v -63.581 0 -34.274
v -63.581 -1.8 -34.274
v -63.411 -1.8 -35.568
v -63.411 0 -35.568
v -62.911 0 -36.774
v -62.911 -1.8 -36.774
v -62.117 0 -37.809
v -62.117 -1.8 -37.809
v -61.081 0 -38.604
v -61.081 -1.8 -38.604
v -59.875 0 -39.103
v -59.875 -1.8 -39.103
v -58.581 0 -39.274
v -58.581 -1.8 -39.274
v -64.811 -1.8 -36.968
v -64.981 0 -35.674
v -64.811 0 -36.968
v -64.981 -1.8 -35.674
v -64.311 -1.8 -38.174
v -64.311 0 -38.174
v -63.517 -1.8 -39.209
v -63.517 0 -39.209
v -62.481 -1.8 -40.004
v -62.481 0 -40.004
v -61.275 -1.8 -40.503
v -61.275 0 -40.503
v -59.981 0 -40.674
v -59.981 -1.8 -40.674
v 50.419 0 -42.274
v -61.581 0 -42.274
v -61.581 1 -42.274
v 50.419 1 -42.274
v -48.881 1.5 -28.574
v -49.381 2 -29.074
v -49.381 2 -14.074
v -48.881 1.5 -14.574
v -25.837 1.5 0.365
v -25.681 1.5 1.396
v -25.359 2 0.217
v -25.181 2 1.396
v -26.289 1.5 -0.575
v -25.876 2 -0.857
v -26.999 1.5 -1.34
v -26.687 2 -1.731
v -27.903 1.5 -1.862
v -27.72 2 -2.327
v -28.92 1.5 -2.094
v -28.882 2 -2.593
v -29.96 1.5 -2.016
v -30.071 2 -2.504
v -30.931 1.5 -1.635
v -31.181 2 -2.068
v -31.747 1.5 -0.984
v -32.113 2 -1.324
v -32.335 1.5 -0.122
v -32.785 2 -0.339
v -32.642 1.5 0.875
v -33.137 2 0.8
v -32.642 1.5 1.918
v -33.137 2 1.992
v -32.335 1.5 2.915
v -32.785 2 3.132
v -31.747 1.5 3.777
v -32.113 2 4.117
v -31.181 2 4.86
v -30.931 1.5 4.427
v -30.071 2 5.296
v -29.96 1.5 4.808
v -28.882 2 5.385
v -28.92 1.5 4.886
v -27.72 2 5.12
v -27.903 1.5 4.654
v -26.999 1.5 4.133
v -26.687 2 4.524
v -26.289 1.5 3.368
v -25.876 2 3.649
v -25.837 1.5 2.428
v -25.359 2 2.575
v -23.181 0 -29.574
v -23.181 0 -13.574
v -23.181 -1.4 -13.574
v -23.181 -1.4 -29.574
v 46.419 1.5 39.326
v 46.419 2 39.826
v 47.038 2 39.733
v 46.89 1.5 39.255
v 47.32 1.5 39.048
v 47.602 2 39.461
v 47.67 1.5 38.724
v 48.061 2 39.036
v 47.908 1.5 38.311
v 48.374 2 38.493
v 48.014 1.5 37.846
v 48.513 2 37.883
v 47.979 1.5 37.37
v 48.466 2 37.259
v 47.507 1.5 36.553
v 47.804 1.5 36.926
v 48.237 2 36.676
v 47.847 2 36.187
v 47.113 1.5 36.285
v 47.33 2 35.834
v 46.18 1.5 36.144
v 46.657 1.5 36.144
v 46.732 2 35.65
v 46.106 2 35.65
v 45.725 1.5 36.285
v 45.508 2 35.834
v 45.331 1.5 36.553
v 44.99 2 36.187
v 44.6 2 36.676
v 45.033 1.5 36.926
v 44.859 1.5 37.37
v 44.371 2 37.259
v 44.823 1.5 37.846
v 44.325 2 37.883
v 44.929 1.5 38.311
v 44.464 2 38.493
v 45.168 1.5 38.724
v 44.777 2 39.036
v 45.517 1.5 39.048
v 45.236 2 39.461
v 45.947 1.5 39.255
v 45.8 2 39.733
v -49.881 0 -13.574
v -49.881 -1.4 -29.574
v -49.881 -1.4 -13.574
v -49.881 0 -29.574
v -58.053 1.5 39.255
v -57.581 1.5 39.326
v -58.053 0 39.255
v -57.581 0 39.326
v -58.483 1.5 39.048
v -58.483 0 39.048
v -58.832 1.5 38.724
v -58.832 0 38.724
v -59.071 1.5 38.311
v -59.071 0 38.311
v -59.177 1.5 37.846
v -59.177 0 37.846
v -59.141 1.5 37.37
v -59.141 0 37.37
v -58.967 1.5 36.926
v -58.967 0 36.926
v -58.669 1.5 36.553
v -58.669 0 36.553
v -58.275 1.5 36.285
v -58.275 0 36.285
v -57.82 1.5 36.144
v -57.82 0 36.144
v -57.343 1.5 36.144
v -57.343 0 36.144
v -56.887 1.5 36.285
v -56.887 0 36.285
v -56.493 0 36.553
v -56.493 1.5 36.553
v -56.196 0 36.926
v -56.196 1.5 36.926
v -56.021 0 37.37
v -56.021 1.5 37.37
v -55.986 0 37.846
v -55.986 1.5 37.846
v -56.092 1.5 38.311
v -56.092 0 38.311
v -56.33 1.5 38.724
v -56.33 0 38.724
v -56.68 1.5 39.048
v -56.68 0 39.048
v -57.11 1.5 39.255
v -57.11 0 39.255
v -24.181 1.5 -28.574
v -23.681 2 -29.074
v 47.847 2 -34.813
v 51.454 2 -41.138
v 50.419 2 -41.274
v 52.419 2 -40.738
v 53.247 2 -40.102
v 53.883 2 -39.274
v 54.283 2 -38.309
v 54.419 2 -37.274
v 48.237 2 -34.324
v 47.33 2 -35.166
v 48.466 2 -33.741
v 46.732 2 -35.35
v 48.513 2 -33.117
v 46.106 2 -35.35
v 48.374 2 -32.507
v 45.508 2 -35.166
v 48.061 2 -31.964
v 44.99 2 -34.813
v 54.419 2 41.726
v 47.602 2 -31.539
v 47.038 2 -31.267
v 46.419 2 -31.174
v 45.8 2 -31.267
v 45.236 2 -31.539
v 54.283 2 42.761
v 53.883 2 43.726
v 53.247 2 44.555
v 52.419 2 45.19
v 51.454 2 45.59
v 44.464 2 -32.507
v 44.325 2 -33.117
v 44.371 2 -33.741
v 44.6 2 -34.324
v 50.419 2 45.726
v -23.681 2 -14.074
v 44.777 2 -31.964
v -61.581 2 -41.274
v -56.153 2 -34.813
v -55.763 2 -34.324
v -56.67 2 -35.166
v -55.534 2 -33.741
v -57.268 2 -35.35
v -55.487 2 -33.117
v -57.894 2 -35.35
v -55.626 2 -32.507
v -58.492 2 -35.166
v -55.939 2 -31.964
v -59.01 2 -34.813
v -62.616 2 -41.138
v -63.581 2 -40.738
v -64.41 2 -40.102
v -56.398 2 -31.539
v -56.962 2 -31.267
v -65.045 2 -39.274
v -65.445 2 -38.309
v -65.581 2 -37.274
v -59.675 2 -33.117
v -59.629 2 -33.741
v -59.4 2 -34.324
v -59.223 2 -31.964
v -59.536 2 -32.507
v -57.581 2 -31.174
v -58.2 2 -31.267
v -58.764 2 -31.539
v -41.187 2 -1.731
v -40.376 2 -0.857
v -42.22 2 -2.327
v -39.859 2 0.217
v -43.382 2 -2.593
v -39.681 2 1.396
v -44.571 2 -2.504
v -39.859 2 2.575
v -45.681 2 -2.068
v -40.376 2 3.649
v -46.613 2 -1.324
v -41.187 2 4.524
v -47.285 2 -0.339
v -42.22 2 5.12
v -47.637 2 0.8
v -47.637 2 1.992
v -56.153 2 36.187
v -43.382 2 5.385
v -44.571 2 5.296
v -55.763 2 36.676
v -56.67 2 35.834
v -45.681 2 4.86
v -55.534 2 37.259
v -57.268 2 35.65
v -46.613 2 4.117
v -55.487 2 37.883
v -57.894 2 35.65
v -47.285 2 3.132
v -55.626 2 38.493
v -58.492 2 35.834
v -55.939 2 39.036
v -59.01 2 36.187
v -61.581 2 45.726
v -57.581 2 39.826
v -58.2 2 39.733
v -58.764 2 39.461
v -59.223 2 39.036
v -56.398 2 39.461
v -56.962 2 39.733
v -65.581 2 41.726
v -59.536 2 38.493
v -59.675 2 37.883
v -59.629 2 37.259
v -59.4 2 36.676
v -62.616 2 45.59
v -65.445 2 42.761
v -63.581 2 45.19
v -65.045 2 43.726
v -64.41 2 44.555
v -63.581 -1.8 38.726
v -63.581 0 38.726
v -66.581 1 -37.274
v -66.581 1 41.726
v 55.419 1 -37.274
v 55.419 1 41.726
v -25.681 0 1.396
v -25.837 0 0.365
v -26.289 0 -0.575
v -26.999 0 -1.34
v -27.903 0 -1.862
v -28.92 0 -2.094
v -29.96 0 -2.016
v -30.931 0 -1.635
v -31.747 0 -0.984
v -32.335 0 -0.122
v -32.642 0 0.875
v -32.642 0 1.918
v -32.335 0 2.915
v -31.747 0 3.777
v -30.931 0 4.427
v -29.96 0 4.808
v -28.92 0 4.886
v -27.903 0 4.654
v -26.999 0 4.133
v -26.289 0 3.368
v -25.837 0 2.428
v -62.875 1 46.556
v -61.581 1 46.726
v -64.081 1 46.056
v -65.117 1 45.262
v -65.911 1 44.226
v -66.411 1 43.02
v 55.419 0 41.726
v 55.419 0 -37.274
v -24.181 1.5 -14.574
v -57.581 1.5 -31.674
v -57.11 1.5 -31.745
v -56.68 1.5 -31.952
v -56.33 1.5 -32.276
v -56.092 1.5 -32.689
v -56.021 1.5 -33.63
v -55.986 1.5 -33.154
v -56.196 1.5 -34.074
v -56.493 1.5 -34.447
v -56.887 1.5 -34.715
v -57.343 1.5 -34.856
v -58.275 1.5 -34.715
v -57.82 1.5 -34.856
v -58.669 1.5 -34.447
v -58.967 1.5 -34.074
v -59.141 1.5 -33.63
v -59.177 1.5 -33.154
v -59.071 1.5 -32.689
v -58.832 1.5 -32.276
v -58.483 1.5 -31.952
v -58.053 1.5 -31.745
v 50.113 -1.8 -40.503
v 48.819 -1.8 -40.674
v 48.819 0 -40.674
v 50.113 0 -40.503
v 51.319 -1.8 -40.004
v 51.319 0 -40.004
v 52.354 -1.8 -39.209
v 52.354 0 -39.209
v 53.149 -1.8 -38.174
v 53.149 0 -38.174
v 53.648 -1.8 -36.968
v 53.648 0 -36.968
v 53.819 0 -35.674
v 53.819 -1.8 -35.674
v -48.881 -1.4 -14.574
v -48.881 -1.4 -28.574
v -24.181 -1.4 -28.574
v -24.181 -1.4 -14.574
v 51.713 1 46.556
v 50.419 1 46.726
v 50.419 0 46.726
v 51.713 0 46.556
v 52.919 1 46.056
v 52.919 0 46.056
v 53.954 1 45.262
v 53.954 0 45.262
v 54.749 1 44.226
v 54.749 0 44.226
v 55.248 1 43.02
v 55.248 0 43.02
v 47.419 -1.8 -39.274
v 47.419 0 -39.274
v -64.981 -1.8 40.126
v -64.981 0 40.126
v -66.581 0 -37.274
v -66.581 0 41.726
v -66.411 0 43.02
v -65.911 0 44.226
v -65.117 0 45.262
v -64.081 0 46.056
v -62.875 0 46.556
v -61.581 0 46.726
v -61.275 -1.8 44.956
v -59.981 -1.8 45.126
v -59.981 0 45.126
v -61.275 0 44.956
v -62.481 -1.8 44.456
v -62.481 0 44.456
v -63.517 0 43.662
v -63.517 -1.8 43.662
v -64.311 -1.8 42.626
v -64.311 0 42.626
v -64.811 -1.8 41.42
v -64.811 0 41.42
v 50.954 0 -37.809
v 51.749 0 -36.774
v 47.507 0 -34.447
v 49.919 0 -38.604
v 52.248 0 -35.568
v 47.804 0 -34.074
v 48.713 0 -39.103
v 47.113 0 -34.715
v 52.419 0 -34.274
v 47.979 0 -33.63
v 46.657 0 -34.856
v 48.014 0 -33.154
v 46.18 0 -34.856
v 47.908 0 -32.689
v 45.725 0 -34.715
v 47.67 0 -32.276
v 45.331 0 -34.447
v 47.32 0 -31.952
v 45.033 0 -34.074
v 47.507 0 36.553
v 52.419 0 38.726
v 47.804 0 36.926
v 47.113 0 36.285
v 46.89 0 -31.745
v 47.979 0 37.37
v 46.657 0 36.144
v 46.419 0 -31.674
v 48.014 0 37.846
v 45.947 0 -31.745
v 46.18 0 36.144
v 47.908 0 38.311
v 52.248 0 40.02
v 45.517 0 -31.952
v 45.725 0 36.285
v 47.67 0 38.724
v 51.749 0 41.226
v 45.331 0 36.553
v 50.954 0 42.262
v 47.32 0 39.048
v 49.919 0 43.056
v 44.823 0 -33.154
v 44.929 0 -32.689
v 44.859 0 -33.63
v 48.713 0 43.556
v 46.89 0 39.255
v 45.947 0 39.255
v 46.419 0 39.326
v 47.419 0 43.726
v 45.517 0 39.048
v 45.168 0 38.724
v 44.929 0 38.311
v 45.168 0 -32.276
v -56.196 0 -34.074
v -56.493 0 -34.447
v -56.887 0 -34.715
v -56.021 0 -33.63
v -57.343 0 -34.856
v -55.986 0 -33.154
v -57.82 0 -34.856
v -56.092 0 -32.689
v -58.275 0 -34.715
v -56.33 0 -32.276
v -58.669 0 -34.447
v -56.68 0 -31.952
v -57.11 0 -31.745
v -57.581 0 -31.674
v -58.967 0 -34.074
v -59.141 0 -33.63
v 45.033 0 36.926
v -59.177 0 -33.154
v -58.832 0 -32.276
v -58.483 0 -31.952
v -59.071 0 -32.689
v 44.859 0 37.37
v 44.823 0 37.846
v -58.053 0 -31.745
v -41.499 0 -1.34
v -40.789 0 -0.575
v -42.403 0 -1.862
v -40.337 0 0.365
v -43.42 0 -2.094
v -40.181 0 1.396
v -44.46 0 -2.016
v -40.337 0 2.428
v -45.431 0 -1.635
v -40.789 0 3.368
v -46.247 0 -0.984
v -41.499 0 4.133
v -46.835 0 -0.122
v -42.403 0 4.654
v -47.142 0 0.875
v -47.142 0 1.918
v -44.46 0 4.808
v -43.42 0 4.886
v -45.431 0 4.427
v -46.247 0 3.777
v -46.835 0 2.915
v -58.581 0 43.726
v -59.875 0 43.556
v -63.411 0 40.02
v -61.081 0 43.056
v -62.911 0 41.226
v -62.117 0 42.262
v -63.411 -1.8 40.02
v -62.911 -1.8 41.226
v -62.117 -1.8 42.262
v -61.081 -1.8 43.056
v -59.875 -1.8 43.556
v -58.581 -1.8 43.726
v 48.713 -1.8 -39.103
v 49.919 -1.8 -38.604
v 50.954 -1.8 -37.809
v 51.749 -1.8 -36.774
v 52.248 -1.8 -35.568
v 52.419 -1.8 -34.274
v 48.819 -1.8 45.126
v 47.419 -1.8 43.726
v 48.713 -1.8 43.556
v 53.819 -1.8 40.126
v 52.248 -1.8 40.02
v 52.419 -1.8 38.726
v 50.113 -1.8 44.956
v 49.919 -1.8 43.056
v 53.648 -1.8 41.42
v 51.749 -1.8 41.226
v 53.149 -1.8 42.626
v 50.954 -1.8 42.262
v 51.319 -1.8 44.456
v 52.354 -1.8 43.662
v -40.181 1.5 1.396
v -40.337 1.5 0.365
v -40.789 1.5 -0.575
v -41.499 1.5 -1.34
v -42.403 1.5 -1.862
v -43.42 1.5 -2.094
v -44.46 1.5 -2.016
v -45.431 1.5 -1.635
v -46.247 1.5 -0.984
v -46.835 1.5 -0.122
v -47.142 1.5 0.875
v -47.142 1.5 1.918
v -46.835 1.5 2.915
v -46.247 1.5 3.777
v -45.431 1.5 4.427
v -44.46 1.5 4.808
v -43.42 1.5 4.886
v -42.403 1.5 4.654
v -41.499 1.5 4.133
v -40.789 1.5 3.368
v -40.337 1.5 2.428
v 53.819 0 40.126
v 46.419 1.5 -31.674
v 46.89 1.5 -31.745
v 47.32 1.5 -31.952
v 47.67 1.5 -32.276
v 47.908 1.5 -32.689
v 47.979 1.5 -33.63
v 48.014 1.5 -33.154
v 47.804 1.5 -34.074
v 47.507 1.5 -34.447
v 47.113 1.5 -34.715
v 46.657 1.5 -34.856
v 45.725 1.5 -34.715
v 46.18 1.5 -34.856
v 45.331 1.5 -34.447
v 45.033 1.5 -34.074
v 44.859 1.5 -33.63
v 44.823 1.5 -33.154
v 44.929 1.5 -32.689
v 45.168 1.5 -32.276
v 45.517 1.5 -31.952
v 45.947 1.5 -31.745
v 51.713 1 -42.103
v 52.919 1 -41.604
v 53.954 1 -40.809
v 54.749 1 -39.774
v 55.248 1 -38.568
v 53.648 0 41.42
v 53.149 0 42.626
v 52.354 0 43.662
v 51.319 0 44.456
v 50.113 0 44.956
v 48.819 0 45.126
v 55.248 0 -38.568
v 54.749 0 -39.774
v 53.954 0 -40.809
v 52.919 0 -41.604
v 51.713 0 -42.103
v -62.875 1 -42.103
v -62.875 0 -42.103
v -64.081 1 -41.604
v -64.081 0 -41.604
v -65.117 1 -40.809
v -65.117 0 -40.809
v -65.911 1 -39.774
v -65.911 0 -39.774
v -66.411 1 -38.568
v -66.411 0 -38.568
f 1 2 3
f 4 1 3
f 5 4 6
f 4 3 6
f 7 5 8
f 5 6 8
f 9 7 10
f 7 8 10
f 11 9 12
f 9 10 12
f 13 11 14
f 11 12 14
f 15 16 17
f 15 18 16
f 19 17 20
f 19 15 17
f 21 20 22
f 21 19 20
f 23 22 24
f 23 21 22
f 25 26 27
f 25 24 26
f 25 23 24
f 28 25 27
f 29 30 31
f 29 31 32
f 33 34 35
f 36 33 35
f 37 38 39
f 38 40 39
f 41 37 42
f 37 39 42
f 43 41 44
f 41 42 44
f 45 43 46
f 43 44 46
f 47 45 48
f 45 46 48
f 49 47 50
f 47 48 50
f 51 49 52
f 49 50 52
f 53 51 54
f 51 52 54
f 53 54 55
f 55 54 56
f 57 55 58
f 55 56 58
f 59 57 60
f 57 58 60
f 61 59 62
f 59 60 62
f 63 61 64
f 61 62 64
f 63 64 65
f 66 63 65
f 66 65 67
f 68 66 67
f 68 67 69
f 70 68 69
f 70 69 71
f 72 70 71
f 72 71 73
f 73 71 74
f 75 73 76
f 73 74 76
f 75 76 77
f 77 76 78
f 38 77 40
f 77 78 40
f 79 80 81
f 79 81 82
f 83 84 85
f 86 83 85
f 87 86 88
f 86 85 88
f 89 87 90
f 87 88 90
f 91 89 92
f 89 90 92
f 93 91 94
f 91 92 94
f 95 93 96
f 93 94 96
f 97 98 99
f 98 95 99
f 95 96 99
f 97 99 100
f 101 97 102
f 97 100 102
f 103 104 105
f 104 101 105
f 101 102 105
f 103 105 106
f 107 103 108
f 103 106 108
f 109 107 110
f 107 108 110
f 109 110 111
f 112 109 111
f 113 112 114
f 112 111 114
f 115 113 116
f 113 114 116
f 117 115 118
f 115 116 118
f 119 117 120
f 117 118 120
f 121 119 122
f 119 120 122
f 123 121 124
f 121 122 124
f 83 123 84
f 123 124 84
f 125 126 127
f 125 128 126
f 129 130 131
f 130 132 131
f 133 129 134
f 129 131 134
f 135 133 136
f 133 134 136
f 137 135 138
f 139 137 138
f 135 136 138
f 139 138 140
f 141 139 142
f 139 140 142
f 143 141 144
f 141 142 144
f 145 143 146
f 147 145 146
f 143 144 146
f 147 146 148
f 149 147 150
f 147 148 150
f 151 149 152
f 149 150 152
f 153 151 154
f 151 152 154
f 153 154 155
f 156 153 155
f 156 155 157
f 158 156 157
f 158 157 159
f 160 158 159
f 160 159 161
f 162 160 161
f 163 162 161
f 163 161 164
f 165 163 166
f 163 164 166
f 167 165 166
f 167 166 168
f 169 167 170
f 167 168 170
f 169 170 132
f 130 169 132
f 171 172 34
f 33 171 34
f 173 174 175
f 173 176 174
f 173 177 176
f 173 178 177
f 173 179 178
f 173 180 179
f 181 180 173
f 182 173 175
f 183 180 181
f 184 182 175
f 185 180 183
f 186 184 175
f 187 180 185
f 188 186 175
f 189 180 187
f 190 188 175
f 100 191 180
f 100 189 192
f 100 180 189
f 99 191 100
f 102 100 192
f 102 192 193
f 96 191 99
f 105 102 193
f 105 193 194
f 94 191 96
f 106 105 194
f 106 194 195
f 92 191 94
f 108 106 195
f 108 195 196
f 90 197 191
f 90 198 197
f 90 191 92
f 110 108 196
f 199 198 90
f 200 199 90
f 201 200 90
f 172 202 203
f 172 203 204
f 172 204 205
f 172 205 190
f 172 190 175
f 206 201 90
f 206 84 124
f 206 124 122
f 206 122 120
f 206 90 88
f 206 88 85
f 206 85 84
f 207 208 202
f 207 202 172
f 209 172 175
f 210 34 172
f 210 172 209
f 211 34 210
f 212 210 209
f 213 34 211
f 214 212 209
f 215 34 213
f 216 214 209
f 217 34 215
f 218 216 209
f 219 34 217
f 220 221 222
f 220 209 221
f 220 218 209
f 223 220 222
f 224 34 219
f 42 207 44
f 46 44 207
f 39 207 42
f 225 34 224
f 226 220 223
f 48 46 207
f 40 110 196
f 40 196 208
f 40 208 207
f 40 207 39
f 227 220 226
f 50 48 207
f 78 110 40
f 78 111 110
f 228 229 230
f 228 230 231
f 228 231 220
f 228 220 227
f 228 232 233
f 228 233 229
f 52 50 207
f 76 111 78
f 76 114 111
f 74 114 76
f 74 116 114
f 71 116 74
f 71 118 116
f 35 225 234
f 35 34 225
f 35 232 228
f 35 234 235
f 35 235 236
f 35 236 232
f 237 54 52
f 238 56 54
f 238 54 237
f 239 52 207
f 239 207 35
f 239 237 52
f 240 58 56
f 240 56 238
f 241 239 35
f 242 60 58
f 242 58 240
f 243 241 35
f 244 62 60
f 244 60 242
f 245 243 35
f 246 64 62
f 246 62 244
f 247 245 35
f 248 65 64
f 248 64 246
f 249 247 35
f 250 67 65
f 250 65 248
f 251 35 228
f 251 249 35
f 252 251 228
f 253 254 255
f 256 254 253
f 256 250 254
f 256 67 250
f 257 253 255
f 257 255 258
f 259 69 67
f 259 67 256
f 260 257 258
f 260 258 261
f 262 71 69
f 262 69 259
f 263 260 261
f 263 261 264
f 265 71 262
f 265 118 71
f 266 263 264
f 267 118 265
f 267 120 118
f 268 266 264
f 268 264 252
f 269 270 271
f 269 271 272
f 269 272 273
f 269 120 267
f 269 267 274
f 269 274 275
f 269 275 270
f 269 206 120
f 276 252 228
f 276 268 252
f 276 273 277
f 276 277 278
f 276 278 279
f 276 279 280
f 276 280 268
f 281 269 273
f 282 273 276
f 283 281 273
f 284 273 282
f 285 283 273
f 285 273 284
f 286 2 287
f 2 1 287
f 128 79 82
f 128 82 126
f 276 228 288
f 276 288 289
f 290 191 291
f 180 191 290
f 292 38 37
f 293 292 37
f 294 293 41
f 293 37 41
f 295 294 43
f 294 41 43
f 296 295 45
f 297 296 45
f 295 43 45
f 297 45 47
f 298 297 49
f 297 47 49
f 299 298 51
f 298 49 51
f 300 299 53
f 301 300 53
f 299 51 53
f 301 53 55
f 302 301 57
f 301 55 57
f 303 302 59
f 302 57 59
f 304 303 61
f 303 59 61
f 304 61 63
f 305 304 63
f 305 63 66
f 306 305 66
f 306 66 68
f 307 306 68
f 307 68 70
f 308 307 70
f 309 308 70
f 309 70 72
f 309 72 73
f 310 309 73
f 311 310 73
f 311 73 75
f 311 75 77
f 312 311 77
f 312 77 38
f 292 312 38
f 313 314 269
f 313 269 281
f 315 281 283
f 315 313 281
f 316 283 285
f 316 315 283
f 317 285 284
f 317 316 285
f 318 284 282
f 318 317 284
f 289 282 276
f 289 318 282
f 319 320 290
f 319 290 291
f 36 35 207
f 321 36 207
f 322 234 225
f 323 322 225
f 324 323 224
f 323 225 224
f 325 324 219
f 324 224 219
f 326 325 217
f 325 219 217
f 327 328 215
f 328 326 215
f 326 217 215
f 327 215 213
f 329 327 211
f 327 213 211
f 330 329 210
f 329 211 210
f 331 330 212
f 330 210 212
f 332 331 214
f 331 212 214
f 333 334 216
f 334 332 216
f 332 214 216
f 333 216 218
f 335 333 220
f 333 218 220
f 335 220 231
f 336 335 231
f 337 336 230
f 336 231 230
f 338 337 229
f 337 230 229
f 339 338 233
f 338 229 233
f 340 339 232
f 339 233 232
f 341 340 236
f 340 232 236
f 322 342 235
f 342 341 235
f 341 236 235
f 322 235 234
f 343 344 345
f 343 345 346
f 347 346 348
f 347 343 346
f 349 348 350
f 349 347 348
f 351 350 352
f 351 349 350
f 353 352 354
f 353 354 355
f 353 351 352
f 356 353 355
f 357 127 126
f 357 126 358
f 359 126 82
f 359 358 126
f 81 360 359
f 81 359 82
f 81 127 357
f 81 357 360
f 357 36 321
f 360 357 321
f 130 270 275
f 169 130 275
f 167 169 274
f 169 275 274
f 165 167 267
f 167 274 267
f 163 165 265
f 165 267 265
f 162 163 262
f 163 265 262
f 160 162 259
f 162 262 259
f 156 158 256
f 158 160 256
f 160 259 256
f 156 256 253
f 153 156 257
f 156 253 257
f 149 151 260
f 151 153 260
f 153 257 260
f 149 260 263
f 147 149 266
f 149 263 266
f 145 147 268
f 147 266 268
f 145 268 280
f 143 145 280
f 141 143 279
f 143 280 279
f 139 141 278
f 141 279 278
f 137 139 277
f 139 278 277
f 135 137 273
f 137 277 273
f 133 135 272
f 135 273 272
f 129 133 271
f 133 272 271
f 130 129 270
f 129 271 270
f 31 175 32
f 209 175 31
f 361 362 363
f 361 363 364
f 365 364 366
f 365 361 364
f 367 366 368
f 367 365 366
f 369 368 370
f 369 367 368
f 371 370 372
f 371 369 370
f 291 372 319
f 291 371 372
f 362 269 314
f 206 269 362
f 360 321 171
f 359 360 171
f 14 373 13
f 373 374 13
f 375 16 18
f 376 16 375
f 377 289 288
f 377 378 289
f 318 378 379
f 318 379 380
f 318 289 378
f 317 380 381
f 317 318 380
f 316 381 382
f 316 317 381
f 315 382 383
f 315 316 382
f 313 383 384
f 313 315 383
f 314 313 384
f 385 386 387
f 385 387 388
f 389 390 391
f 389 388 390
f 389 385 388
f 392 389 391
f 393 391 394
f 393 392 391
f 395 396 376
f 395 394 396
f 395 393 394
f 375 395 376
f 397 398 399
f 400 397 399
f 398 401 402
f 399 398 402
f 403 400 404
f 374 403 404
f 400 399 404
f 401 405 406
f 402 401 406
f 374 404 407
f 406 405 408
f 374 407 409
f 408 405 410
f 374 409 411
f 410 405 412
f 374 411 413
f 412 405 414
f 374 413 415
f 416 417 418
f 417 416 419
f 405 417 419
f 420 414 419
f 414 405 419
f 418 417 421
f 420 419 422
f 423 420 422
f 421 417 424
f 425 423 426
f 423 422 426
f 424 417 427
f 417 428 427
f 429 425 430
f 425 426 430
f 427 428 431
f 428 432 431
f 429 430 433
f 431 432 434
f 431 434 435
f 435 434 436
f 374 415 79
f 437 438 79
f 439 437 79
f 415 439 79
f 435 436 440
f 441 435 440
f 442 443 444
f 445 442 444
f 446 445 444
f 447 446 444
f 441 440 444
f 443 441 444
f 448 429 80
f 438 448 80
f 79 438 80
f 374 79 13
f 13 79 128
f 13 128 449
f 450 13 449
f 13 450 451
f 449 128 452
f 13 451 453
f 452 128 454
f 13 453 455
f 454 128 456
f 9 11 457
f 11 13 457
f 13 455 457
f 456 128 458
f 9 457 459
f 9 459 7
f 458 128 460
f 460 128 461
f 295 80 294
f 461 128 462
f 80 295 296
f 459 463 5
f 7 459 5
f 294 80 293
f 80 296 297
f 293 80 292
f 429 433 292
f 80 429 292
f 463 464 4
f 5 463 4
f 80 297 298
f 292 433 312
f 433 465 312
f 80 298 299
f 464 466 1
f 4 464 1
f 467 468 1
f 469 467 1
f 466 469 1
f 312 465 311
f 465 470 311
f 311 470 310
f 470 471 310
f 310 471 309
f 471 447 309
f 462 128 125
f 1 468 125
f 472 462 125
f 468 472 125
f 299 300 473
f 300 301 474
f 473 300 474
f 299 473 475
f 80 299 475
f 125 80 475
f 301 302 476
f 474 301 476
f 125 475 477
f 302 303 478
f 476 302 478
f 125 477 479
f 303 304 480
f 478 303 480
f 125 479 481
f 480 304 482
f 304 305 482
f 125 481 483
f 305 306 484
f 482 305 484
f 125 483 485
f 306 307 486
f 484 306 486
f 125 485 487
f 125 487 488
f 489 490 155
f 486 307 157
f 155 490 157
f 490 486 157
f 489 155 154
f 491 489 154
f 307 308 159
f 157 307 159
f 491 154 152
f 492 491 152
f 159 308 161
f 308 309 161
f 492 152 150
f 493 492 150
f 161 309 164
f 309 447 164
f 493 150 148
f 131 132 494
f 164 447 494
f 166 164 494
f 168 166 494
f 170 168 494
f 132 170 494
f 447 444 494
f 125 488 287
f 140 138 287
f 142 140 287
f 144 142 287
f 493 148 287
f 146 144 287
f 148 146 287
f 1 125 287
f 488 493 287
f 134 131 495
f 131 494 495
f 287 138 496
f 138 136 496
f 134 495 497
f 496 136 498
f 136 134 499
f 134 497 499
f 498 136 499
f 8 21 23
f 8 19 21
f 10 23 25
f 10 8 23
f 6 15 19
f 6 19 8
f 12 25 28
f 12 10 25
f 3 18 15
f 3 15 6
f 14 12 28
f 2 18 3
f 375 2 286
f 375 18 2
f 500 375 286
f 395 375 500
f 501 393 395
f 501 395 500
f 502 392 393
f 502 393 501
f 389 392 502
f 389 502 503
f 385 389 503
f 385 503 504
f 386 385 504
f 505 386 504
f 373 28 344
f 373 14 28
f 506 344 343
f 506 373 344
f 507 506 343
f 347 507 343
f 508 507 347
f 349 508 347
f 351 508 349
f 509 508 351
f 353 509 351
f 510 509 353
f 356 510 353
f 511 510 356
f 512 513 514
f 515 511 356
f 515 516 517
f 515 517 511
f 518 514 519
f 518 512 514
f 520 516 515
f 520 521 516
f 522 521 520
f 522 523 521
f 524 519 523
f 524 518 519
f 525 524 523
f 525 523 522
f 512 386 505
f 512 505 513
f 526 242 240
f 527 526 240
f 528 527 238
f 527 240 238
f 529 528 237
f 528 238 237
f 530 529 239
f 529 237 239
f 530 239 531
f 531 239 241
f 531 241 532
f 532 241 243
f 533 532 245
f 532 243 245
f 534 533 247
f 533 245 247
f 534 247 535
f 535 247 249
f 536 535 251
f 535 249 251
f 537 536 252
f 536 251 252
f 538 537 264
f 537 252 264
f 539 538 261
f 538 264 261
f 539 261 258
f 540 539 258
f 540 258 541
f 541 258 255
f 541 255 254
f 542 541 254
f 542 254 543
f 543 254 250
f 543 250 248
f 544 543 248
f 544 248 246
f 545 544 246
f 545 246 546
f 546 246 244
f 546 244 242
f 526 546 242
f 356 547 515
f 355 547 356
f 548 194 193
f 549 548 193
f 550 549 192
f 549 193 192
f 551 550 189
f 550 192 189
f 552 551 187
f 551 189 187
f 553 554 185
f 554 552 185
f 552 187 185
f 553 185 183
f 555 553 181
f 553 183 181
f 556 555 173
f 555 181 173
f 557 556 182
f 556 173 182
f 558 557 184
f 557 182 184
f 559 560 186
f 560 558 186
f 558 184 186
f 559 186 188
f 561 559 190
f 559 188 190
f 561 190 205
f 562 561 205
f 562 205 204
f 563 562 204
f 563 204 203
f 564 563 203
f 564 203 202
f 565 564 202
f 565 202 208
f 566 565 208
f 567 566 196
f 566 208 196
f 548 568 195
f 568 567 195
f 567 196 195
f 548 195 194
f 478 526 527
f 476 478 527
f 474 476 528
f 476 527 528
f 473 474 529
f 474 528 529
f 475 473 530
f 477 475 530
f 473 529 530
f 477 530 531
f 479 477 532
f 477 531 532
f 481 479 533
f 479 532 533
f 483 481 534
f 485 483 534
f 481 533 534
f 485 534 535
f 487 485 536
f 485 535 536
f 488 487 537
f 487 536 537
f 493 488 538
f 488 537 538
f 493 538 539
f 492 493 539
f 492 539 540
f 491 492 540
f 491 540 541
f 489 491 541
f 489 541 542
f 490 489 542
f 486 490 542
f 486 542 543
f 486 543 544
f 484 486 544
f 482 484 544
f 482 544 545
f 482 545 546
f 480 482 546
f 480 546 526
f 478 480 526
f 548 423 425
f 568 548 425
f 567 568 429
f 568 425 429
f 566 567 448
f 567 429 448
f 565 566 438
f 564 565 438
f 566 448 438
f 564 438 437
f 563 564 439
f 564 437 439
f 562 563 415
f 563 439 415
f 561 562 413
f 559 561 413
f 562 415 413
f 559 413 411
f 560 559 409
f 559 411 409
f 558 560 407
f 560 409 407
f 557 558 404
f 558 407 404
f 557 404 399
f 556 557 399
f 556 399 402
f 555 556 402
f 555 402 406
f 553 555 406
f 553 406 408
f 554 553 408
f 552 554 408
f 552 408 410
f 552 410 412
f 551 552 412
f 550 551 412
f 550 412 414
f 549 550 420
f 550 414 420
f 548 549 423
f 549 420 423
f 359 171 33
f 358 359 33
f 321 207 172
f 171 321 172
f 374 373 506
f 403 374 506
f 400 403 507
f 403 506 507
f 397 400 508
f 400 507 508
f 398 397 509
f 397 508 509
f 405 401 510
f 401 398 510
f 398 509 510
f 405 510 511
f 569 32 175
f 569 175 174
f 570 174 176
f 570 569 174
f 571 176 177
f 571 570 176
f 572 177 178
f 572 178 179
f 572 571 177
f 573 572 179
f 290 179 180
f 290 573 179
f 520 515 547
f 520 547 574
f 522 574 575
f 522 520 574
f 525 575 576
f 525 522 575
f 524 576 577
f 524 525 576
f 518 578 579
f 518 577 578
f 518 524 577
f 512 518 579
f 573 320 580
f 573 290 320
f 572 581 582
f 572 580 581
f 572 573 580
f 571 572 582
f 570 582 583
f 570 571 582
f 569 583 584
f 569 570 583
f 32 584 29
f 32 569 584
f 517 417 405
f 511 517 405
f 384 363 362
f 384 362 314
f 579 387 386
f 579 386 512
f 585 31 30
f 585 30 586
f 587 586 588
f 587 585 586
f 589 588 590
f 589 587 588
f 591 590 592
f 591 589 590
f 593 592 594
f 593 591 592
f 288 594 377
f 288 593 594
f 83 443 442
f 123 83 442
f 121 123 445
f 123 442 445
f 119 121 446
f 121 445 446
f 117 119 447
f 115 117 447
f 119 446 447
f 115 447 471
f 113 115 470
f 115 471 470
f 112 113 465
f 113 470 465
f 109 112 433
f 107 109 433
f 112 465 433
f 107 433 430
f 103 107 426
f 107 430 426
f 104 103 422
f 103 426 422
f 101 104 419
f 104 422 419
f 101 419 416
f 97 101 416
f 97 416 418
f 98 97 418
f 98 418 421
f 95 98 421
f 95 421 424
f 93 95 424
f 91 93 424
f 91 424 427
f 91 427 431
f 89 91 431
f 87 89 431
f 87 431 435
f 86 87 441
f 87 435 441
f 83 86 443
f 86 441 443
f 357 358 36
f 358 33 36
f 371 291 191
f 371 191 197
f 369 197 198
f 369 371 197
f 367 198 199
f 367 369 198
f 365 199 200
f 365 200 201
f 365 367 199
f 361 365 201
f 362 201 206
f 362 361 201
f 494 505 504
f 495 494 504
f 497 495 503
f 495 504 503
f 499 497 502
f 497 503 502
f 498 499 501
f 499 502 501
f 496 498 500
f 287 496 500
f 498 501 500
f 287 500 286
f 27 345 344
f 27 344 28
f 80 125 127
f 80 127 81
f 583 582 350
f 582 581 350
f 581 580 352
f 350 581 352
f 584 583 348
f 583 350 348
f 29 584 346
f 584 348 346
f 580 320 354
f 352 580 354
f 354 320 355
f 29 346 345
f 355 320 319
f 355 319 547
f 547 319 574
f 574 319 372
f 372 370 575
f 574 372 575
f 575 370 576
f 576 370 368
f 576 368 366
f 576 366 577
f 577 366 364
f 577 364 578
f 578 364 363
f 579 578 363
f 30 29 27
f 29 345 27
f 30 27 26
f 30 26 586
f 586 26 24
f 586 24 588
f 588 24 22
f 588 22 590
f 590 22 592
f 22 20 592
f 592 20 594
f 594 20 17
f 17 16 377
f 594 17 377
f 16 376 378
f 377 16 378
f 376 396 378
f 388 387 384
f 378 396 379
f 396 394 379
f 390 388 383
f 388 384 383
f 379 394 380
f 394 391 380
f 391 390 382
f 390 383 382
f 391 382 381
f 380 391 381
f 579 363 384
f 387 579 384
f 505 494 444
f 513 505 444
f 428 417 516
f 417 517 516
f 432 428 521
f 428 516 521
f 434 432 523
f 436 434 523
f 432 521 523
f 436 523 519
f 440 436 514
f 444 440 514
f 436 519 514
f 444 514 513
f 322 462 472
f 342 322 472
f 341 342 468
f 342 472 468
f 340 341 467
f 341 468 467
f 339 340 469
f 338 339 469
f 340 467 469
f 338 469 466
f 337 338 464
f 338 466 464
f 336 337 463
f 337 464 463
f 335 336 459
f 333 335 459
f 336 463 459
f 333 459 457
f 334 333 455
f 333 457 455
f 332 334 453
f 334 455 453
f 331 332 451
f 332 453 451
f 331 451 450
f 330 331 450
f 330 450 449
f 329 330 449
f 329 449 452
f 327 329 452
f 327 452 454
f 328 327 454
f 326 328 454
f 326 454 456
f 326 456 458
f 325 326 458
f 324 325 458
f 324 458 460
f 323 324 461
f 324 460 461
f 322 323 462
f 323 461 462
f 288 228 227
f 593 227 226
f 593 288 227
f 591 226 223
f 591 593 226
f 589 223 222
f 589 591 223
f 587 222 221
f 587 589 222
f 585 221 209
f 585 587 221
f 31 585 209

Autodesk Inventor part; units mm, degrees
ref_plane "YZ Plane" through (0, 0, 0) normal (1, 0, 0) x (0, 1, 0)
ref_plane "XZ Plane" through (0, 0, 0) normal (0, 1, 0) x (-1, 0, 0)
ref_plane "XY Plane" through (0, 0, 0) normal (0, 0, 1) x (1, 0, 0)
sketch "Sketch1" plane through (0, 0, 0) normal (0, 1, 0) x (-1, 0, 0)
  line L0 (66.5812, -42.2738) -> (-55.4188, -42.2738)
  line L1 (-55.4188, -42.2738) -> (-55.4188, 46.7262)
  line L2 (-55.4188, 46.7262) -> (66.5812, 46.7262)
  line L3 (66.5812, 46.7262) -> (66.5812, -42.2738)
  point P0 (0, 0)
  dimension "d0" = 122
  dimension "d1" = 89
extrude "Extrusion1" add sketch "Sketch1" along normal blind 2
sketch "Sketch2" plane through (0, 0, 0) normal (0, -1, 0) x (1, 0, 0)
  line L0 (53.8188, -40.6738) -> (-64.9812, -40.6738)
  line L1 (-64.9812, -40.6738) -> (-64.9812, 45.1262)
  line L2 (-64.9812, 45.1262) -> (53.8188, 45.1262)
  line L3 (53.8188, 45.1262) -> (53.8188, -40.6738)
  line L4 (55.4188, -42.2738) -> (-66.5812, -42.2738) projected
  line L5 (55.4188, 46.7262) -> (55.4188, -42.2738) projected
  line L6 (-66.5812, 46.7262) -> (55.4188, 46.7262) projected
  line L7 (-66.5812, -42.2738) -> (-66.5812, 46.7262) projected
  line L8 (52.4188, -39.2738) -> (-63.5812, -39.2738)
  line L9 (-63.5812, -39.2738) -> (-63.5812, 43.7262)
  line L10 (-63.5812, 43.7262) -> (52.4188, 43.7262)
  line L11 (52.4188, 43.7262) -> (52.4188, -39.2738)
  point P0 (0, 0)
  dimension "d4" = 1.6
  dimension "d5" = 1.6
  dimension "d6" = 1.6
  dimension "d7" = 1.6
  dimension "d8" = 1.4
  dimension "d9" = 1.4
  dimension "d10" = 1.4
  dimension "d11" = 1.4
extrude "Extrusion2" add sketch "Sketch2" along normal blind 1.8 contours L0 L1 L2 L3
sketch "Sketch3" plane through (0, 2, 0) normal (0, 1, 0) x (1, 0, 0)
  line L0 (55.4188, 42.2738) -> (-66.5812, 42.2738) projected
  line L1 (-66.5812, 42.2738) -> (-66.5812, -46.7262) projected
  point P0 (0, 0)
  point P1 (-57.5812, 33.2738)
  dimension "d14" = 9
  dimension "d15" = 9
hole "Hole1" at (-57.5812, 2, -33.2738) direction (0, -1, 0) diameter 3.2 end through all
pattern_linear "Rectangular Pattern1" count 2 spacing 71 along (0, 0, 1) count 2 spacing 104 along (1, 0, 0) of "Hole1"
fillet "Fillet1" radius 5 12 edges at (-66.5812, 1, 46.7262) (-64.9812, -0.9, 45.1262) (-63.5812, -0.9, 43.7262) (-66.5812, 1, -42.2738) (-64.9812, -0.9, -40.6738) (-63.5812, -0.9, -39.2738) (55.4188, 1, -42.2738) (53.8188, -0.9, -40.6738) (52.4188, -0.9, -39.2738) (52.4188, -0.9, 43.7262) (53.8188, -0.9, 45.1262) (55.4188, 1, 46.7262)
chamfer "Chamfer1" distance 1 angle 45 8 edges at (-5.5812, 2, -42.2738) (-65.1167, 2, -40.8093) (-66.5812, 2, 2.2262) (-65.1167, 2, 45.2618) (-5.5812, 2, 46.7262) (53.9543, 2, 45.2618) (55.4188, 2, 2.2262) (53.9543, 2, -40.8093)
sketch "Sketch4" plane through (0, 2, 0) normal (0, 1, 0) x (1, 0, 0)
  line L0 (-48.8812, 28.5738) -> (-24.1812, 28.5738)
  line L1 (-24.1812, 28.5738) -> (-24.1812, 14.5738)
  line L2 (-24.1812, 14.5738) -> (-48.8812, 14.5738)
  line L3 (-48.8812, 14.5738) -> (-48.8812, 28.5738)
  line L4 (50.4188, 42.2738) -> (-61.5812, 42.2738) projected
  line L5 (-66.5812, 37.2738) -> (-66.5812, -41.7262) projected
  circle A0 centre (-43.6812, -1.3962) radius 3.5
  circle A1 centre (-29.1812, -1.3962) radius 3.5
  point P0 (0, 0)
  dimension "d33" = 24.7
  dimension "d34" = 14
  dimension "d35" = 13.7
  dimension "d36" = 17.7
  dimension "d37" = 7
  dimension "d38" = 7
  dimension "d39" = 22.9
  dimension "d40" = 14.5
  dimension "d41" = 43.67
  dimension "d42" = 43.67
extrude "Extrusion3" cut sketch "Sketch4" against normal through all
sketch "Sketch5" plane through (0, 0, 0) normal (0, -1, 0) x (1, 0, 0)
  line L0 (-48.8812, -14.5738) -> (-24.1812, -14.5738) projected
  line L1 (-48.8812, -14.5738) -> (-24.1812, -14.5738)
  line L2 (-24.1812, -14.5738) -> (-24.1812, -28.5738)
  line L3 (-24.1812, -28.5738) -> (-48.8812, -28.5738)
  line L4 (-48.8812, -28.5738) -> (-48.8812, -14.5738)
  line L5 (-49.8812, -13.5738) -> (-23.1812, -13.5738)
  line L6 (-23.1812, -13.5738) -> (-23.1812, -29.5738)
  line L7 (-23.1812, -29.5738) -> (-49.8812, -29.5738)
  line L8 (-49.8812, -29.5738) -> (-49.8812, -13.5738)
  point P0 (0, 0)
  dimension "d45" = 1
  dimension "d46" = 1
  dimension "d47" = 1
  dimension "d48" = 1
extrude "Extrusion4" add sketch "Sketch5" along normal blind 1.4
chamfer "Chamfer2" distance 0.5 angle 45 10 edges at (-47.1812, 2, 1.3962) (-48.8812, 2, -21.5738) (-36.5312, 2, -14.5738) (-36.5312, 2, -28.5738) (-24.1812, 2, -21.5738) (-32.6812, 2, 1.3962) (46.4188, 2, 36.1262) (-57.5812, 2, 36.1262) (-57.5812, 2, -34.8738) (46.4188, 2, -34.8738)
equation "\"d5\" = d4"
equation "\"d6\" = d4"
equation "\"d7\" = d4"
equation "\"d9\" = d8"
equation "\"d10\" = d8"
equation "\"d11\" = d8"
equation "\"d42\" = d41"
equation "\"d46\" = d45"
equation "\"d47\" = d45"
equation "\"d48\" = d45"
properties part number "housing_top_v_2"
